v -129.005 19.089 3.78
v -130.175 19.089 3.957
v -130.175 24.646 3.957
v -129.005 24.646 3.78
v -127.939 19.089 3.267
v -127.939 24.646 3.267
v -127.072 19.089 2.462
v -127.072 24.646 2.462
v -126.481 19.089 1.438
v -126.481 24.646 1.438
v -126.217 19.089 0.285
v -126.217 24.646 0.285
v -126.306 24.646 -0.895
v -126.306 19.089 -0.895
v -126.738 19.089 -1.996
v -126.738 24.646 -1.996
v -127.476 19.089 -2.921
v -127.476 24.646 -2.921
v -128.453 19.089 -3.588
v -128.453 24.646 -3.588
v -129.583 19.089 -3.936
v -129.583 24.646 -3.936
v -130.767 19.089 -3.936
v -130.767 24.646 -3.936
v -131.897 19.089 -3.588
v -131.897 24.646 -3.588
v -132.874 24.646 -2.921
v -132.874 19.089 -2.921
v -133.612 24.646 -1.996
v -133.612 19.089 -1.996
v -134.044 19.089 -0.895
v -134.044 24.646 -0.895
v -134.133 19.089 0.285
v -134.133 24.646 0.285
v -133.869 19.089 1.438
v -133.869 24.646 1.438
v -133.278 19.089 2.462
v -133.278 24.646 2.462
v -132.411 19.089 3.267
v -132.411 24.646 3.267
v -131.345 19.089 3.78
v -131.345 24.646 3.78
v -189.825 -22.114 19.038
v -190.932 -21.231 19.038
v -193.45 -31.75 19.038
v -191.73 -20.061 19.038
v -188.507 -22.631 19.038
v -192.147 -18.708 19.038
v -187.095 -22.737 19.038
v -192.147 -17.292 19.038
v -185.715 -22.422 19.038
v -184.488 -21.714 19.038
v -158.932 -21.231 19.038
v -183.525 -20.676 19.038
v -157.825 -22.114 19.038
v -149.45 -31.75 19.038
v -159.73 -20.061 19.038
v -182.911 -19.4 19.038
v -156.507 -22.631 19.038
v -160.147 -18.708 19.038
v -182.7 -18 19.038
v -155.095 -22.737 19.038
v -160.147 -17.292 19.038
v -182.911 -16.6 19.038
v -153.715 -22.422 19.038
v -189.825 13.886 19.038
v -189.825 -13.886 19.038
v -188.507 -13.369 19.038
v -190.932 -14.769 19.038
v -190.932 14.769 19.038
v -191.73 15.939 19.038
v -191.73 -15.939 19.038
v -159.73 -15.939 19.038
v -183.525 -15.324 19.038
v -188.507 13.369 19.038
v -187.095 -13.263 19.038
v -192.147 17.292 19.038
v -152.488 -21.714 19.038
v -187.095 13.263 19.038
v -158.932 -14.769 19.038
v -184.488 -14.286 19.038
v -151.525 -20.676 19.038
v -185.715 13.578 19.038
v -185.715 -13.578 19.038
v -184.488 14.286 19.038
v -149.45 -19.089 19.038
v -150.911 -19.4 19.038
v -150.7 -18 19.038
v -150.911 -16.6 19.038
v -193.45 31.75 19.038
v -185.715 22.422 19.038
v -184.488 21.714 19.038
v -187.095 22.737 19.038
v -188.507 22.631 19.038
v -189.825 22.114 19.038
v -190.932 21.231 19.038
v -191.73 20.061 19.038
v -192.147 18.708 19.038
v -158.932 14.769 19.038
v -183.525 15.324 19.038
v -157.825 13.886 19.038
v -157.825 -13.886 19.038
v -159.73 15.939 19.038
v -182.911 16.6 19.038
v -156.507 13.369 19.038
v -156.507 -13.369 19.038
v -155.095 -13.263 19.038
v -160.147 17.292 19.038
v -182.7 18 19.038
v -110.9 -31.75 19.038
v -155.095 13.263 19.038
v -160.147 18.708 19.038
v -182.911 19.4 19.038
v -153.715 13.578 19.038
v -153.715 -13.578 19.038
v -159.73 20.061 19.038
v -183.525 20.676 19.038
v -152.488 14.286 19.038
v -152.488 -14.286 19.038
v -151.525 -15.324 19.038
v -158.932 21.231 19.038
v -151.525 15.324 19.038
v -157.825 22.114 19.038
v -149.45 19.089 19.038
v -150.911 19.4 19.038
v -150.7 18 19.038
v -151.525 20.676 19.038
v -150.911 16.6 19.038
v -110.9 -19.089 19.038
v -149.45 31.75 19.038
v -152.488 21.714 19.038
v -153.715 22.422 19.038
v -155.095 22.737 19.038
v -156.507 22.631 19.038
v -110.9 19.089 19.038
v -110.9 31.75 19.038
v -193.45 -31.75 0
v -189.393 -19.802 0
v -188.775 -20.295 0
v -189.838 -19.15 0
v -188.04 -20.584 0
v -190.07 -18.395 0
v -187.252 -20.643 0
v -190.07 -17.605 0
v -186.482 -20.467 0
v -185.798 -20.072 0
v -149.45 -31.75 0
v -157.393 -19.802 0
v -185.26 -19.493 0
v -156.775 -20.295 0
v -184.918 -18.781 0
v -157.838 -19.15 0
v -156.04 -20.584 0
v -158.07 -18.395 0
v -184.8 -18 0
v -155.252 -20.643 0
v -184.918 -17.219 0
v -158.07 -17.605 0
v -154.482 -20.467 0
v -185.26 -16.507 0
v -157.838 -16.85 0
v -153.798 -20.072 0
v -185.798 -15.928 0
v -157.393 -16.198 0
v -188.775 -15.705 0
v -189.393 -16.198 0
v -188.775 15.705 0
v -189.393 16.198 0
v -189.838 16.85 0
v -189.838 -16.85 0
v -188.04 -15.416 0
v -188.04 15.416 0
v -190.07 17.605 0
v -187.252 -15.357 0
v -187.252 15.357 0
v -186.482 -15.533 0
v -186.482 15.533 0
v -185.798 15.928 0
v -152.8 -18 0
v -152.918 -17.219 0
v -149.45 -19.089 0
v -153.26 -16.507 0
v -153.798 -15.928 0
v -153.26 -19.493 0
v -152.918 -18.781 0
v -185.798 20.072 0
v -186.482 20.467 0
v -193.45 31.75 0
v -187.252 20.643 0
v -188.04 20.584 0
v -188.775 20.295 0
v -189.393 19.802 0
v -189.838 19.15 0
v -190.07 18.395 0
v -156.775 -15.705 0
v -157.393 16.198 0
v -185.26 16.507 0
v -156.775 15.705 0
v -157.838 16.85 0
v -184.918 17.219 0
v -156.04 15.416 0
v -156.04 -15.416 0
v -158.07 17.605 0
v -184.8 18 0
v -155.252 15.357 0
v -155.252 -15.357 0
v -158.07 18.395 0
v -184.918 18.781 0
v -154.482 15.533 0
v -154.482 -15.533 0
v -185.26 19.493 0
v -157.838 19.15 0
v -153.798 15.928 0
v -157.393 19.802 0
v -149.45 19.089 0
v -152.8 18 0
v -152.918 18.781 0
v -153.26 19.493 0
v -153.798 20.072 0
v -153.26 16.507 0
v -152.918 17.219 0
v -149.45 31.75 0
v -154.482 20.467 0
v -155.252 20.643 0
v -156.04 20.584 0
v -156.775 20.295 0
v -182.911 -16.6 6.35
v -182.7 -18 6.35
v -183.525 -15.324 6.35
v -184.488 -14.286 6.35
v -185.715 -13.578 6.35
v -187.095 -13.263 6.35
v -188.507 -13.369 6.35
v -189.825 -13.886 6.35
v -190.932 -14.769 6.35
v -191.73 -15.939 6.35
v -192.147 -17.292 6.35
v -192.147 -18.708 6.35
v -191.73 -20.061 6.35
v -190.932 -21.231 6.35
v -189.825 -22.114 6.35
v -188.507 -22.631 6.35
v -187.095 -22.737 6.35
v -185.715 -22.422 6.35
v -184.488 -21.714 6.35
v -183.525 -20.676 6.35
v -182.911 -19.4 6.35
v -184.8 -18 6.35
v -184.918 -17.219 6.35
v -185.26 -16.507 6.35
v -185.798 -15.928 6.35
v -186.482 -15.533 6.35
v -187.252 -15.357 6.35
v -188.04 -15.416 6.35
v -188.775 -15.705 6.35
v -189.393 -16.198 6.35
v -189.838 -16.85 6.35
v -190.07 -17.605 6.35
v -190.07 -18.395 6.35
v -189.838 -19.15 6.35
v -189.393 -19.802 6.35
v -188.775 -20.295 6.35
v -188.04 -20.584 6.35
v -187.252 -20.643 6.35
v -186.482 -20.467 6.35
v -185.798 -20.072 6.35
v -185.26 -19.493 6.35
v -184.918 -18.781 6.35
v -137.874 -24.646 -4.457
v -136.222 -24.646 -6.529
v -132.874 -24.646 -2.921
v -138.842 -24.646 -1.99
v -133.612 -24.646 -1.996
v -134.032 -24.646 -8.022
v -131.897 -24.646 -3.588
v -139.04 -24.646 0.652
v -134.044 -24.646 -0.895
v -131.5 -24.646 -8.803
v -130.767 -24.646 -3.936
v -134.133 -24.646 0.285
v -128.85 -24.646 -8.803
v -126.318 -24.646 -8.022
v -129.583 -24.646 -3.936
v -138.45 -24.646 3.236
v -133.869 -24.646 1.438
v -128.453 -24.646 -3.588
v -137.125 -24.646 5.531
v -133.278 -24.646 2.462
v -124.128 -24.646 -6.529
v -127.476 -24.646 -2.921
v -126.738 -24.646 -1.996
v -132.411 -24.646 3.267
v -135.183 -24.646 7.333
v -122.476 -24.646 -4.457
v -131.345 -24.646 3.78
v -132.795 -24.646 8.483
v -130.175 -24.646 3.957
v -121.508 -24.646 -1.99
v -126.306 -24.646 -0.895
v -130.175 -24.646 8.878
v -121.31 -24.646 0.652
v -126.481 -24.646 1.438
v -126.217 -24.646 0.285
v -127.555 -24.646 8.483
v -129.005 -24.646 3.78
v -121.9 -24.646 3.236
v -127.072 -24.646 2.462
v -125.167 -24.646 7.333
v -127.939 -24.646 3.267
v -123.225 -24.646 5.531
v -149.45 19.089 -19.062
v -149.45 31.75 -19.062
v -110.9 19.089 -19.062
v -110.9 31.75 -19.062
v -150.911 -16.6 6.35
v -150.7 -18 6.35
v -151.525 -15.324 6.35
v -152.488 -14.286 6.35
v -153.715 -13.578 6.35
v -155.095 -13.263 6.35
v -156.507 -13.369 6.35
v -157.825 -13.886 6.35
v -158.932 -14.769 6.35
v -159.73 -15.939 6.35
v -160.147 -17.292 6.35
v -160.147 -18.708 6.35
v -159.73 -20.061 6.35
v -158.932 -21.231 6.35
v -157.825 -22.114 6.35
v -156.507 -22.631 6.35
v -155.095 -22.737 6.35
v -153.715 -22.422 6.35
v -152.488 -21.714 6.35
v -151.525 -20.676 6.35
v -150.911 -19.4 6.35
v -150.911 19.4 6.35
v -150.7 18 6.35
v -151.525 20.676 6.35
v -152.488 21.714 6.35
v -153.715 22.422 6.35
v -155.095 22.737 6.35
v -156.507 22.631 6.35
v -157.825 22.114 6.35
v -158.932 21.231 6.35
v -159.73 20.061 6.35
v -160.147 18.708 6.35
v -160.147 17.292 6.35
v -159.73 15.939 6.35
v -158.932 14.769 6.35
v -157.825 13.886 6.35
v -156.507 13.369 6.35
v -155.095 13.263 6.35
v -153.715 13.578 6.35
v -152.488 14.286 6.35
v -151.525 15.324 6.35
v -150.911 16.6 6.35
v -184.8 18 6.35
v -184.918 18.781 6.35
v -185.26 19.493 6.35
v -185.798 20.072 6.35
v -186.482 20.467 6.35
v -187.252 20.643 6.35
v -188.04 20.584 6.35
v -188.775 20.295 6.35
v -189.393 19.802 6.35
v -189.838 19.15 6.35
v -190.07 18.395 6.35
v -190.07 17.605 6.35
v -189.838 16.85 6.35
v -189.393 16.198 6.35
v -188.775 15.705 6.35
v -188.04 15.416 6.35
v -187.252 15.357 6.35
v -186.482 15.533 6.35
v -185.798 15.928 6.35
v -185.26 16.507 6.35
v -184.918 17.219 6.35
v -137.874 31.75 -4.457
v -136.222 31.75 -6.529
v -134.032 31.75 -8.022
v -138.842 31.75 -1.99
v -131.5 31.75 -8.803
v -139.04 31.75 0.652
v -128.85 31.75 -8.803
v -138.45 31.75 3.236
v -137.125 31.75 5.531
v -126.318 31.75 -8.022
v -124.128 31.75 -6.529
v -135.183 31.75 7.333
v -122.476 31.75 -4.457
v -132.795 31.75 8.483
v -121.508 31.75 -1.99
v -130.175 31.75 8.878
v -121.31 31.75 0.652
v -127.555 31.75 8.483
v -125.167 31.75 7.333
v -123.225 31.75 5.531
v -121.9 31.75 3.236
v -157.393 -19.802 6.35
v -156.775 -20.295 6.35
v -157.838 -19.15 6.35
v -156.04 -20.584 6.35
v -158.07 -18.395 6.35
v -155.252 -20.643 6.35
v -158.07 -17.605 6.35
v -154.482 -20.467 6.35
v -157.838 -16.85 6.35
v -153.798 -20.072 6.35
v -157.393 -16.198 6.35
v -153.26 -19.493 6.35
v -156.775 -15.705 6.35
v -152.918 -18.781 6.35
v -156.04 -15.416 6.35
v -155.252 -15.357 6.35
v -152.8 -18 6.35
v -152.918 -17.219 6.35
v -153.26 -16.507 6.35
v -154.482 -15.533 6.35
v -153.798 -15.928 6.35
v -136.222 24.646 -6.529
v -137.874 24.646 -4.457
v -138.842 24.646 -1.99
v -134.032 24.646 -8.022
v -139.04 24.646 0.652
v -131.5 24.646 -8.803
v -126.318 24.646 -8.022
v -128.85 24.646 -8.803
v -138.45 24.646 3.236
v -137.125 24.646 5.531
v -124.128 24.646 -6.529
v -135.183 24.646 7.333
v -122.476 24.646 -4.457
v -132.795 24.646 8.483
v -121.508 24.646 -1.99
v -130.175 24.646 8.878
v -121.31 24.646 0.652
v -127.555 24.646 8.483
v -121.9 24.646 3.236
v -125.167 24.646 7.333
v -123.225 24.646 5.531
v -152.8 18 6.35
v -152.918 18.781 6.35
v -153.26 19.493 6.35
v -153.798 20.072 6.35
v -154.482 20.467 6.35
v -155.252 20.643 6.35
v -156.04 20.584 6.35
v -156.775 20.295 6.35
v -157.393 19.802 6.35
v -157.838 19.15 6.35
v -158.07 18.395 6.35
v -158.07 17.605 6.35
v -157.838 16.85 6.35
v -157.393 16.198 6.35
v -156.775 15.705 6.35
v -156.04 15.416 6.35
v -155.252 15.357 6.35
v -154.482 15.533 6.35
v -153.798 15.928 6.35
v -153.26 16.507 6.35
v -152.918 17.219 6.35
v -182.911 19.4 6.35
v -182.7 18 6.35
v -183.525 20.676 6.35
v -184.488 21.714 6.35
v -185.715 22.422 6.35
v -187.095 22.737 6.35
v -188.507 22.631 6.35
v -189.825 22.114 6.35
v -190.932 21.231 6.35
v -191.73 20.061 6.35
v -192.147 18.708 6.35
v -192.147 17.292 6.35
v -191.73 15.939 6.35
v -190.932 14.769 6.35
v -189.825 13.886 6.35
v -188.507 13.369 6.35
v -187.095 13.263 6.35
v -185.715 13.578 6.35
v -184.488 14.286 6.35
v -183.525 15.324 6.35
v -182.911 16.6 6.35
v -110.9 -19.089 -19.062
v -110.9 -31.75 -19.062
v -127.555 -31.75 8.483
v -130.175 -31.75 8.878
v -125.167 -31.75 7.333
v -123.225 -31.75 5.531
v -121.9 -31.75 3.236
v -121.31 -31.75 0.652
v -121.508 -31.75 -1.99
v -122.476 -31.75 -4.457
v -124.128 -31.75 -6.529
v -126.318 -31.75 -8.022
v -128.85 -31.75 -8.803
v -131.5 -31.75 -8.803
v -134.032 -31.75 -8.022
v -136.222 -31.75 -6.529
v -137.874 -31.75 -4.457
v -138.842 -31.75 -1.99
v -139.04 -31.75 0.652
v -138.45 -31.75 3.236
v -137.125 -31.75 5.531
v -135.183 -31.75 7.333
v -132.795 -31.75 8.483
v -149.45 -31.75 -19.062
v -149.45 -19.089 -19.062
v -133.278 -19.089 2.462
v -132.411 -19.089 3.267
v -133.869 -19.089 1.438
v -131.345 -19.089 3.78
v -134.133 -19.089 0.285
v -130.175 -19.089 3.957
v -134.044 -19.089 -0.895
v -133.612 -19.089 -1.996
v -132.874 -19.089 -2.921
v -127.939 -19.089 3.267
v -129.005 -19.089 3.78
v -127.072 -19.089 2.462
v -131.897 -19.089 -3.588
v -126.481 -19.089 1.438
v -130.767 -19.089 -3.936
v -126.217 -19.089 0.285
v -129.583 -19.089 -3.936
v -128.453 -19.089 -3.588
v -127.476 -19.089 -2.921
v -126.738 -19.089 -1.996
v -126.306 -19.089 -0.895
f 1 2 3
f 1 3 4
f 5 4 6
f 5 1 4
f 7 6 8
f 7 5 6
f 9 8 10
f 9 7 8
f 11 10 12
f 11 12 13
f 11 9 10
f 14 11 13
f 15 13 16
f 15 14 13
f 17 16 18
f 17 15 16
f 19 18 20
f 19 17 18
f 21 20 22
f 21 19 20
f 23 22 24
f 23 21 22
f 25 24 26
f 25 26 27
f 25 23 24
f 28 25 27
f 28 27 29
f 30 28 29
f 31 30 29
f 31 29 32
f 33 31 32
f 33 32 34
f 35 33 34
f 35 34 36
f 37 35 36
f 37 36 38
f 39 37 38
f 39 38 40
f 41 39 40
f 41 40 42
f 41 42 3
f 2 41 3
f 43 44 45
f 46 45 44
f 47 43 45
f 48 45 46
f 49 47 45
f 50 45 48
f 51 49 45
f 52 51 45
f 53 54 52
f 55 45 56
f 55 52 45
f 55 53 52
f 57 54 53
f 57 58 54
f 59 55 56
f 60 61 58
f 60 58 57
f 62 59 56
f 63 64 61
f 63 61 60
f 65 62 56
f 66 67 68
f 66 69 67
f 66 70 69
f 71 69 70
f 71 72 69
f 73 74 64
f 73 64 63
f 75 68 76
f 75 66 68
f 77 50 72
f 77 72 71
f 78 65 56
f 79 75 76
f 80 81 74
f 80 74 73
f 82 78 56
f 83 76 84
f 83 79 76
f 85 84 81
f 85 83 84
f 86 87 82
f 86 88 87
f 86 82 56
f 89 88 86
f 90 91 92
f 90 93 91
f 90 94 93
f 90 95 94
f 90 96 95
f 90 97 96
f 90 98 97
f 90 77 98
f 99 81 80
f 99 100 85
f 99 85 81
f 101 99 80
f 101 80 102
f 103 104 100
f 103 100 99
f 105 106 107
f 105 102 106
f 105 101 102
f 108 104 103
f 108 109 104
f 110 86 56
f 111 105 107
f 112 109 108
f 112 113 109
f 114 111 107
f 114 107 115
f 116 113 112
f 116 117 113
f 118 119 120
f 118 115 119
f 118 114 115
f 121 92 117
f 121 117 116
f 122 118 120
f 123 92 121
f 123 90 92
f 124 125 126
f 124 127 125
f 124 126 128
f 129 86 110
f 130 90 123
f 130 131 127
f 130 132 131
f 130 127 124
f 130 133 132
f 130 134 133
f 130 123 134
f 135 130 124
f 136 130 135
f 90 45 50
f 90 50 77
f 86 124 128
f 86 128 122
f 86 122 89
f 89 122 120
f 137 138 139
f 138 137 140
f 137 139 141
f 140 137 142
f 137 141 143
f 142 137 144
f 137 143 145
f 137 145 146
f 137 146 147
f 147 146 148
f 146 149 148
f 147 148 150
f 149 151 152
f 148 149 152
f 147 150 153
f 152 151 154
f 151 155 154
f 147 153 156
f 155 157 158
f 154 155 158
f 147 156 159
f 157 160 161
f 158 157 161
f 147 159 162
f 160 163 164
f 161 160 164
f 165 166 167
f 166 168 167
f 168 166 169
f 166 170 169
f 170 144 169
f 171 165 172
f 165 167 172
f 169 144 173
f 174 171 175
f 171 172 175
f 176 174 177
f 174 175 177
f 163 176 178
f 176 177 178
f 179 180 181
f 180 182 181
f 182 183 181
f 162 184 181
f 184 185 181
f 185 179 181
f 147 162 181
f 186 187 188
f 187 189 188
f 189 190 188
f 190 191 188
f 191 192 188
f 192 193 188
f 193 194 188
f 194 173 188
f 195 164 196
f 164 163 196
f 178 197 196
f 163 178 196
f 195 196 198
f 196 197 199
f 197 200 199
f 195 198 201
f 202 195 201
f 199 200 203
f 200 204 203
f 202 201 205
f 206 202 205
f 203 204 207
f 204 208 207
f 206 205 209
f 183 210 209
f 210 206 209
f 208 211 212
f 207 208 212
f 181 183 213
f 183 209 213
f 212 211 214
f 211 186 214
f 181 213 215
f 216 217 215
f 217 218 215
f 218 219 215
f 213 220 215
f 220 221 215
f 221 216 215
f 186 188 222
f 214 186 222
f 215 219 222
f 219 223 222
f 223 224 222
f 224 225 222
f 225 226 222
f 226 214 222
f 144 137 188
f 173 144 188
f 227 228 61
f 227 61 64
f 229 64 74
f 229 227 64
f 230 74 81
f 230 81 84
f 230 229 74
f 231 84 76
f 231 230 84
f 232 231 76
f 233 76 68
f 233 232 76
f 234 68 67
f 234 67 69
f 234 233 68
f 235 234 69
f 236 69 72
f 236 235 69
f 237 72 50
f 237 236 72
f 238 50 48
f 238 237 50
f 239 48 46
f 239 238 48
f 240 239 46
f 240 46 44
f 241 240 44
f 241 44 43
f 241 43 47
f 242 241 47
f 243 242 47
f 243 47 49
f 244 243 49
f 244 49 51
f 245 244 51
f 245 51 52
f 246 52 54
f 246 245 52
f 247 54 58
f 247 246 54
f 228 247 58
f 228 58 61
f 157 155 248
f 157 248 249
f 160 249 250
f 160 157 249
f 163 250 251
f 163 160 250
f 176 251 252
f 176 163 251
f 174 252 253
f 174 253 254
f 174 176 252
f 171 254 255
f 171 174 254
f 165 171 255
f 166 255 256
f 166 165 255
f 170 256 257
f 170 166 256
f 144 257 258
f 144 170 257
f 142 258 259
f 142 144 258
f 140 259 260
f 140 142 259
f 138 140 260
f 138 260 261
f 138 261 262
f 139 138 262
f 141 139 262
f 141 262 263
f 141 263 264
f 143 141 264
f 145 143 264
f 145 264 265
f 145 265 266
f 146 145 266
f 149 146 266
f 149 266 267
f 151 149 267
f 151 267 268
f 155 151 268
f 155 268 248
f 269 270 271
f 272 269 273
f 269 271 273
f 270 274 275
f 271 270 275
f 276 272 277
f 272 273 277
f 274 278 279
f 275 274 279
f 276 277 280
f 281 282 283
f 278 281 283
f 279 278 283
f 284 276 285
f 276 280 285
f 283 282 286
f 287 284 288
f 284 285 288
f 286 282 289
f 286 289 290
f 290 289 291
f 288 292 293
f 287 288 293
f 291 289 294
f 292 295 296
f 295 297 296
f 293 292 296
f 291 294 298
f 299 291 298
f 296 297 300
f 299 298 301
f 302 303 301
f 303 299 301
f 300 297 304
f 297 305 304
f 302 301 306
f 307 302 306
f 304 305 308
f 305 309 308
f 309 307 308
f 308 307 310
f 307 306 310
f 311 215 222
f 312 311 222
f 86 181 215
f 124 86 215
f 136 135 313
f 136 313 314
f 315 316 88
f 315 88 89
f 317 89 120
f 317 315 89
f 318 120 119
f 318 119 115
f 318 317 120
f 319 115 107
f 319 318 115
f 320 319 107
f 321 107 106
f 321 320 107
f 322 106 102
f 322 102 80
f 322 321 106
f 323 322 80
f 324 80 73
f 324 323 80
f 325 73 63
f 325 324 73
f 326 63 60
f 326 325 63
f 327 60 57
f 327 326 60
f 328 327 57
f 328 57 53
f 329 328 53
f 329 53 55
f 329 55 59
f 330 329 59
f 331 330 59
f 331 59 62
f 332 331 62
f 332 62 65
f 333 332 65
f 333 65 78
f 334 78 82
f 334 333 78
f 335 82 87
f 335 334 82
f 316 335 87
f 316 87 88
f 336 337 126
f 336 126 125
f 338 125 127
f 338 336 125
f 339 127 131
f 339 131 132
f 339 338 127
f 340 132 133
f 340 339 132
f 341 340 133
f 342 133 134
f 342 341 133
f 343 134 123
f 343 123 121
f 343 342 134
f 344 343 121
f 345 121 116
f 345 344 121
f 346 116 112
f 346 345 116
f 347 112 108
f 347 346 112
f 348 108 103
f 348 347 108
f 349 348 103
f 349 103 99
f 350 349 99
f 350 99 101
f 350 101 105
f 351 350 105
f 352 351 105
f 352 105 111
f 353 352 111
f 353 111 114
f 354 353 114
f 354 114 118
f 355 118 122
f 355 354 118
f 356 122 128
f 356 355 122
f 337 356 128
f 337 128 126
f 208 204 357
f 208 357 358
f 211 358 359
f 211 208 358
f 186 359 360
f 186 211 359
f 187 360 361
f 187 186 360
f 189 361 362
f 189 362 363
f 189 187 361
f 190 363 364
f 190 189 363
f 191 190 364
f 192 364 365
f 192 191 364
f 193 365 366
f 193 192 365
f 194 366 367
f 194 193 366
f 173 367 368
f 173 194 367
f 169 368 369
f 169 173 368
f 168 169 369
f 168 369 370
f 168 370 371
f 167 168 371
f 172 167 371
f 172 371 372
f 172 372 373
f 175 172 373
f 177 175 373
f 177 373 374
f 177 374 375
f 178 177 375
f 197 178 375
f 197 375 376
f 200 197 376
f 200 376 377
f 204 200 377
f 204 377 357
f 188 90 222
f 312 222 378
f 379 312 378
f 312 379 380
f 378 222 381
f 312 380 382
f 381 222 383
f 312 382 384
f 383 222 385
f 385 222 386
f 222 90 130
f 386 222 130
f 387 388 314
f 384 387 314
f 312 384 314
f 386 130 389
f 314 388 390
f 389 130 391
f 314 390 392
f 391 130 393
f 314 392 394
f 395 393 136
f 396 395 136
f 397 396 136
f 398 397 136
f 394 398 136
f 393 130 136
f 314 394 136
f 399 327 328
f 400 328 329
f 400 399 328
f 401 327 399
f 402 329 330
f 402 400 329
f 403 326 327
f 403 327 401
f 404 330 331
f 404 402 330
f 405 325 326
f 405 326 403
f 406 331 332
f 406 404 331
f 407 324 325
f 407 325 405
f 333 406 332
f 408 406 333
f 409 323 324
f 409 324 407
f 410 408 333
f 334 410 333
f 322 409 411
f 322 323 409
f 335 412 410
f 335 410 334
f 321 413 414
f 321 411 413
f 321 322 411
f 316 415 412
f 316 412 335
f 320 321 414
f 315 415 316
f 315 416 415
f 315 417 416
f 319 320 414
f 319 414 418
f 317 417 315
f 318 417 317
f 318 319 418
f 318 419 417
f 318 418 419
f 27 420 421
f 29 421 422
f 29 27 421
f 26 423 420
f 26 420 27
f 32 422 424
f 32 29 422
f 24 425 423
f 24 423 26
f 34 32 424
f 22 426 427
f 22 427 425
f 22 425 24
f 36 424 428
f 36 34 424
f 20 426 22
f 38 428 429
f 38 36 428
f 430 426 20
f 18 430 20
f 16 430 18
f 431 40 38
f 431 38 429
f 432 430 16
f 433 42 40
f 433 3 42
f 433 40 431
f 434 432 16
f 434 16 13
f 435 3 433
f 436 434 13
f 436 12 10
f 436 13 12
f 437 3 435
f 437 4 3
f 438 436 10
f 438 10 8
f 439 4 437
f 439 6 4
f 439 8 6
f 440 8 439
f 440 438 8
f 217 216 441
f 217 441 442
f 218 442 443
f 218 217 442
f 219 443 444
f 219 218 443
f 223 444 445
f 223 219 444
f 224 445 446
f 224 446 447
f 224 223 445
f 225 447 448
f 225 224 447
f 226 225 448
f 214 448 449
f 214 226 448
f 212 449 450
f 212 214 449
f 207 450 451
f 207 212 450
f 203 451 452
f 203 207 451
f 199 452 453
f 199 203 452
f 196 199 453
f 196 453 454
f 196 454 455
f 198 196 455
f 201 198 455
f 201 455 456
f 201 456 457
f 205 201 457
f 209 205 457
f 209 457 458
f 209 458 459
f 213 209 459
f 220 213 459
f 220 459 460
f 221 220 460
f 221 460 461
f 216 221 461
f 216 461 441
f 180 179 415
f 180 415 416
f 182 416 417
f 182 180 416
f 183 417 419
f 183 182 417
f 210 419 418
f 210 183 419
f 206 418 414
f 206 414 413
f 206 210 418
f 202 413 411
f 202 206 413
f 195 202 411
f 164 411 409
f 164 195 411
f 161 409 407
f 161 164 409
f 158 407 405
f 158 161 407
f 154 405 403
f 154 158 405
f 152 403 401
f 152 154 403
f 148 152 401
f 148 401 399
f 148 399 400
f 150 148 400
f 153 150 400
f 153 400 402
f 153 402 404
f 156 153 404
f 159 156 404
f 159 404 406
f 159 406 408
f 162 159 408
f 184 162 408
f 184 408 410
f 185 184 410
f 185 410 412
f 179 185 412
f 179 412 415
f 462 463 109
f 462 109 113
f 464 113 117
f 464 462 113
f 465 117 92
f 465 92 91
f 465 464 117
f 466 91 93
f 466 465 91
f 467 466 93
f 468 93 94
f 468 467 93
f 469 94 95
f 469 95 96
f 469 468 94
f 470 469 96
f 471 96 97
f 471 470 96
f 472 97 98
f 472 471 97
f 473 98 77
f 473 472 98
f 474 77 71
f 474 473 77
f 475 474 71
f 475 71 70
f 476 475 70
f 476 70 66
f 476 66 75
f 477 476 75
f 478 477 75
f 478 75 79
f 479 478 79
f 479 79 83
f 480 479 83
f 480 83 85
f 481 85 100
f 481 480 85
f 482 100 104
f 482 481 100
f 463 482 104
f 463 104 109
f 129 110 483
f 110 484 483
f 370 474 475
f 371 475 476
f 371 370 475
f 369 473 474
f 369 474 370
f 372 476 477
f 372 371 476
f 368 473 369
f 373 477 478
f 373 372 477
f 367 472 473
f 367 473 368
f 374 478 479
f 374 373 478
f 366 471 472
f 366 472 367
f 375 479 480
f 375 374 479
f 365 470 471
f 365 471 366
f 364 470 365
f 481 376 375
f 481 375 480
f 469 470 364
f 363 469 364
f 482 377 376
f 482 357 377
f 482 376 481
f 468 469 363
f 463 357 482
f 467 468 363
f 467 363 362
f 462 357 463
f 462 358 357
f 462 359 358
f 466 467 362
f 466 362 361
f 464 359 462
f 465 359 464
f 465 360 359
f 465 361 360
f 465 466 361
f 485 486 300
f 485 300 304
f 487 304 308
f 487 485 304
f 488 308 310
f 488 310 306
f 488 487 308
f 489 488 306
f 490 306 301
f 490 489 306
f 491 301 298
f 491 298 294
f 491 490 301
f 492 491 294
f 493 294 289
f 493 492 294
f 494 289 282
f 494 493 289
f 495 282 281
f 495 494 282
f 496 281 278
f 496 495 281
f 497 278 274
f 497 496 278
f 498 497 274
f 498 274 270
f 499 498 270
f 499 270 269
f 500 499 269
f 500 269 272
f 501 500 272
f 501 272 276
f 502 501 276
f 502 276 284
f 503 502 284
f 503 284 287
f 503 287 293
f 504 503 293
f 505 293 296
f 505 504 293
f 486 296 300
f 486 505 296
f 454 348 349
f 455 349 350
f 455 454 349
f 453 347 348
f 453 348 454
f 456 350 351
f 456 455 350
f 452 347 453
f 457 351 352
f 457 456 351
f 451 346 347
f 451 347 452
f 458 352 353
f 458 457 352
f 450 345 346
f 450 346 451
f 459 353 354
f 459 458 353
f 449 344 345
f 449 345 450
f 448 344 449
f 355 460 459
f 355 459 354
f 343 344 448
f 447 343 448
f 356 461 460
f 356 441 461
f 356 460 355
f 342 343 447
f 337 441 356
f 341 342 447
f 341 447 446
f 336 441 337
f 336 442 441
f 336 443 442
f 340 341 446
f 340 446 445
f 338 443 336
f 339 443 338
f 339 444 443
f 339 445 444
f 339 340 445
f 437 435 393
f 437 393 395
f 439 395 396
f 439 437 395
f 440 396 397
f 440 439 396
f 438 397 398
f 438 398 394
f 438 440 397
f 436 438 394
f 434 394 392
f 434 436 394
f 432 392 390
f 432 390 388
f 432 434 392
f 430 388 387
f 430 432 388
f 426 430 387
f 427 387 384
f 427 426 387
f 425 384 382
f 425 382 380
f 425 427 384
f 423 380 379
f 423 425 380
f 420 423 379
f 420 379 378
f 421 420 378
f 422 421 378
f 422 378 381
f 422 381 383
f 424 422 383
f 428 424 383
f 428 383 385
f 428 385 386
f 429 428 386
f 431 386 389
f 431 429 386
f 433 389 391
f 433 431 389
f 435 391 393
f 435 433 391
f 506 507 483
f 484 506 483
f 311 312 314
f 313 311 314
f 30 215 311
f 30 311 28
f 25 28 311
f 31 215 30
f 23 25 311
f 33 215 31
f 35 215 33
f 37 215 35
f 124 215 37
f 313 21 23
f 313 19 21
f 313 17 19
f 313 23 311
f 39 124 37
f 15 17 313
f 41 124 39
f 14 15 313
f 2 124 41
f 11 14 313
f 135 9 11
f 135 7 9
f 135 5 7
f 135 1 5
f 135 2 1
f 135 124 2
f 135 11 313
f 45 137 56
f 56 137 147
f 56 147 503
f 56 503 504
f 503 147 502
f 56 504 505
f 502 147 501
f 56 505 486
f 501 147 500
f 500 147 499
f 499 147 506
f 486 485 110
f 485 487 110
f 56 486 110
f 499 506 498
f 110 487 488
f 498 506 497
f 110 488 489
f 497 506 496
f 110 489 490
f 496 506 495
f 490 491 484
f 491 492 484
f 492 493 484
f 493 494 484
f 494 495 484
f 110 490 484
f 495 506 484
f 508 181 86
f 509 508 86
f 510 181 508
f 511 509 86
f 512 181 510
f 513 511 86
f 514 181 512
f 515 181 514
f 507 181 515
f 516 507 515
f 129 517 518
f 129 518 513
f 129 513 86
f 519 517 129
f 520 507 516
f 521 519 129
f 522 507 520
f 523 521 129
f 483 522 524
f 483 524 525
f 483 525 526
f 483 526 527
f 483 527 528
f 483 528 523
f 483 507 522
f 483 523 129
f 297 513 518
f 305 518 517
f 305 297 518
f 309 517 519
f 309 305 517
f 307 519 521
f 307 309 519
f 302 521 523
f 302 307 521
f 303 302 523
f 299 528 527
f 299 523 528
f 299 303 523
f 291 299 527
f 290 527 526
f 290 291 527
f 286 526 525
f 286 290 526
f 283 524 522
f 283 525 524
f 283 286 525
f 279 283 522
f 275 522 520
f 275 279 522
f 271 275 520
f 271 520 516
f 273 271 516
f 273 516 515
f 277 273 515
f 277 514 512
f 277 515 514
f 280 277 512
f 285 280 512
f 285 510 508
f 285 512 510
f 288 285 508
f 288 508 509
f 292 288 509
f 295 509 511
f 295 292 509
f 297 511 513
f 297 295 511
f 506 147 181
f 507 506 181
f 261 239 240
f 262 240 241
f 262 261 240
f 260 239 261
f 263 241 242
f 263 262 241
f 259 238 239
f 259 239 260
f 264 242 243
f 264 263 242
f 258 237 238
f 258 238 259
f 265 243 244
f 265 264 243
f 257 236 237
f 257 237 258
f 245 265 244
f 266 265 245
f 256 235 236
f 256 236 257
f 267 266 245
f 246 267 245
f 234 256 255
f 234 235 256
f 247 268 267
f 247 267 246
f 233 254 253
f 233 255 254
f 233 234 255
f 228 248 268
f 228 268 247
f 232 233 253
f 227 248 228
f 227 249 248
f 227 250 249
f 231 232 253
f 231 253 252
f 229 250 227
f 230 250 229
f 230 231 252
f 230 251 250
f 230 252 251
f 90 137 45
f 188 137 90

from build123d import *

# Parameters (mm, degrees)
SKETCH1_W               = 44
SKETCH1_H               = 63.5
SKETCH1_W_2             = 38.55
SKETCH1_H_2             = 12.661180653
BOSS_EXTRUDE1_DEPTH     = 19.038019
SKETCH1_3_W             = 38.55
SKETCH1_3_H             = 12.661180653
BOSS_EXTRUDE2_DEPTH     = 19.061980653
CUT_EXTRUDE1_DEPTH      = 197.962748017
CUT_EXTRUDE1_DEPTH_BACK = 197.962748017
SKETCH2_R               = 3.96875
CUT_EXTRUDE2_START      = -31.75
SKETCH2_3_R             = 8.89
SKETCH2_3_R_2           = 3.96875
CUT_EXTRUDE2_DEPTH      = 7.103661
CUT_EXTRUDE3_START      = 24.646339347
SKETCH2_4_R             = 8.89
SKETCH2_4_R_2           = 3.96875
CUT_EXTRUDE3_DEPTH      = 7.103660653
SKETCH3_R               = 2.65
CUT_EXTRUDE4_DEPTH      = 197.962748017
CUT_EXTRUDE5_START      = 6.349999653
SKETCH3_3_R             = 4.75
SKETCH3_3_R_2           = 2.65
SKETCH3_3_R_3           = 2.5
CUT_EXTRUDE5_DEPTH      = 12.688019347


with BuildPart() as part:
    # Sketch1 → Boss-Extrude1 (new body)
    with BuildSketch(Plane.XY):
        with Locations((-171.45, 0)):
            Rectangle(SKETCH1_W, SKETCH1_H)
        with Locations((-130.175, -25.419409674)):
            Rectangle(SKETCH1_W_2, SKETCH1_H_2)
        with Locations((-130.175, 25.419409674)):
            Rectangle(SKETCH1_W_2, SKETCH1_H_2)
    extrude(amount=BOSS_EXTRUDE1_DEPTH)

    # Sketch1<3> → Boss-Extrude2 (add)
    with BuildSketch(Plane.XY):
        with Locations((-130.175, 25.419409674)):
            Rectangle(SKETCH1_3_W, SKETCH1_3_H)
        with Locations((-130.175, -25.419409674)):
            Rectangle(SKETCH1_3_W, SKETCH1_3_H)
    extrude(amount=-BOSS_EXTRUDE2_DEPTH)

    # Sketch2 → Cut-Extrude1 (cut, two sides: drawn at the far end of the back side and taken through both)
    with BuildSketch(Plane(origin=(0, 0, 0), x_dir=(1, 0, 0), z_dir=(0, 1, 0)).offset(-CUT_EXTRUDE1_DEPTH_BACK)):
        with Locations(Location((-130.175, 0.011980653, 0), (0, 0, 270))):
            Circle(SKETCH2_R)
    extrude(amount=CUT_EXTRUDE1_DEPTH + CUT_EXTRUDE1_DEPTH_BACK, mode=Mode.SUBTRACT)

    # Sketch2<3> → Cut-Extrude2 (cut)
    with BuildSketch(Plane(origin=(0, 0, 0), x_dir=(1, 0, 0), z_dir=(0, 1, 0)).offset(CUT_EXTRUDE2_START)):
        with Locations(Location((-130.175, 0.011980653, 0), (0, 0, 270))):
            Circle(SKETCH2_3_R)
        with Locations(Location((-130.175, 0.011980653, 0), (0, 0, 270))):
            Circle(SKETCH2_3_R_2, mode=Mode.SUBTRACT)
    extrude(amount=CUT_EXTRUDE2_DEPTH, mode=Mode.SUBTRACT)

    # Sketch2<4> → Cut-Extrude3 (cut)
    with BuildSketch(Plane(origin=(0, 0, 0), x_dir=(1, 0, 0), z_dir=(0, 1, 0)).offset(CUT_EXTRUDE3_START)):
        with Locations(Location((-130.175, 0.011980653, 0), (0, 0, 270))):
            Circle(SKETCH2_4_R)
        with Locations(Location((-130.175, 0.011980653, 0), (0, 0, 270))):
            Circle(SKETCH2_4_R_2, mode=Mode.SUBTRACT)
    extrude(amount=CUT_EXTRUDE3_DEPTH, mode=Mode.SUBTRACT)

    # Sketch3 → Cut-Extrude4 (cut, through all)
    with BuildSketch(Plane.XY):
        with Locations((-187.45, 18)):
            Circle(SKETCH3_R)
        with Locations((-155.45, 18)):
            Circle(SKETCH3_R)
        with Locations((-155.45, -18)):
            Circle(SKETCH3_R)
        with Locations((-187.45, -18)):
            Circle(SKETCH3_R)
    extrude(amount=CUT_EXTRUDE4_DEPTH, mode=Mode.SUBTRACT)

    # Sketch3<3> → Cut-Extrude5 (cut)
    # profile 1 of 8: a face of its own
    with BuildSketch(Plane.XY.offset(CUT_EXTRUDE5_START)):
        with Locations((-187.45, 18)):
            Circle(SKETCH3_3_R)
        with Locations((-187.45, 18)):
            Circle(SKETCH3_3_R_2, mode=Mode.SUBTRACT)
    # profile 2 of 8: a face of its own
    with BuildSketch(Plane.XY.offset(CUT_EXTRUDE5_START)):
        with Locations((-187.45, 18)):
            Circle(SKETCH3_3_R_3)
    # profile 3 of 8: a face of its own
    with BuildSketch(Plane.XY.offset(CUT_EXTRUDE5_START)):
        with Locations((-155.45, 18)):
            Circle(SKETCH3_3_R)
        with Locations((-155.45, 18)):
            Circle(SKETCH3_3_R_2, mode=Mode.SUBTRACT)
    # profile 4 of 8: a face of its own
    with BuildSketch(Plane.XY.offset(CUT_EXTRUDE5_START)):
        with Locations((-155.45, 18)):
            Circle(SKETCH3_3_R_3)
    # profile 5 of 8: a face of its own
    with BuildSketch(Plane.XY.offset(CUT_EXTRUDE5_START)):
        with Locations((-155.45, -18)):
            Circle(SKETCH3_3_R)
        with Locations((-155.45, -18)):
            Circle(SKETCH3_3_R_2, mode=Mode.SUBTRACT)
    # profile 6 of 8: a face of its own
    with BuildSketch(Plane.XY.offset(CUT_EXTRUDE5_START)):
        with Locations((-155.45, -18)):
            Circle(SKETCH3_3_R_3)
    # profile 7 of 8: a face of its own
    with BuildSketch(Plane.XY.offset(CUT_EXTRUDE5_START)):
        with Locations((-187.45, -18)):
            Circle(SKETCH3_3_R)
        with Locations((-187.45, -18)):
            Circle(SKETCH3_3_R_2, mode=Mode.SUBTRACT)
    # profile 8 of 8: a face of its own
    with BuildSketch(Plane.XY.offset(CUT_EXTRUDE5_START)):
        with Locations((-187.45, -18)):
            Circle(SKETCH3_3_R_3)
    extrude(amount=CUT_EXTRUDE5_DEPTH, mode=Mode.SUBTRACT)


solid = part.part
